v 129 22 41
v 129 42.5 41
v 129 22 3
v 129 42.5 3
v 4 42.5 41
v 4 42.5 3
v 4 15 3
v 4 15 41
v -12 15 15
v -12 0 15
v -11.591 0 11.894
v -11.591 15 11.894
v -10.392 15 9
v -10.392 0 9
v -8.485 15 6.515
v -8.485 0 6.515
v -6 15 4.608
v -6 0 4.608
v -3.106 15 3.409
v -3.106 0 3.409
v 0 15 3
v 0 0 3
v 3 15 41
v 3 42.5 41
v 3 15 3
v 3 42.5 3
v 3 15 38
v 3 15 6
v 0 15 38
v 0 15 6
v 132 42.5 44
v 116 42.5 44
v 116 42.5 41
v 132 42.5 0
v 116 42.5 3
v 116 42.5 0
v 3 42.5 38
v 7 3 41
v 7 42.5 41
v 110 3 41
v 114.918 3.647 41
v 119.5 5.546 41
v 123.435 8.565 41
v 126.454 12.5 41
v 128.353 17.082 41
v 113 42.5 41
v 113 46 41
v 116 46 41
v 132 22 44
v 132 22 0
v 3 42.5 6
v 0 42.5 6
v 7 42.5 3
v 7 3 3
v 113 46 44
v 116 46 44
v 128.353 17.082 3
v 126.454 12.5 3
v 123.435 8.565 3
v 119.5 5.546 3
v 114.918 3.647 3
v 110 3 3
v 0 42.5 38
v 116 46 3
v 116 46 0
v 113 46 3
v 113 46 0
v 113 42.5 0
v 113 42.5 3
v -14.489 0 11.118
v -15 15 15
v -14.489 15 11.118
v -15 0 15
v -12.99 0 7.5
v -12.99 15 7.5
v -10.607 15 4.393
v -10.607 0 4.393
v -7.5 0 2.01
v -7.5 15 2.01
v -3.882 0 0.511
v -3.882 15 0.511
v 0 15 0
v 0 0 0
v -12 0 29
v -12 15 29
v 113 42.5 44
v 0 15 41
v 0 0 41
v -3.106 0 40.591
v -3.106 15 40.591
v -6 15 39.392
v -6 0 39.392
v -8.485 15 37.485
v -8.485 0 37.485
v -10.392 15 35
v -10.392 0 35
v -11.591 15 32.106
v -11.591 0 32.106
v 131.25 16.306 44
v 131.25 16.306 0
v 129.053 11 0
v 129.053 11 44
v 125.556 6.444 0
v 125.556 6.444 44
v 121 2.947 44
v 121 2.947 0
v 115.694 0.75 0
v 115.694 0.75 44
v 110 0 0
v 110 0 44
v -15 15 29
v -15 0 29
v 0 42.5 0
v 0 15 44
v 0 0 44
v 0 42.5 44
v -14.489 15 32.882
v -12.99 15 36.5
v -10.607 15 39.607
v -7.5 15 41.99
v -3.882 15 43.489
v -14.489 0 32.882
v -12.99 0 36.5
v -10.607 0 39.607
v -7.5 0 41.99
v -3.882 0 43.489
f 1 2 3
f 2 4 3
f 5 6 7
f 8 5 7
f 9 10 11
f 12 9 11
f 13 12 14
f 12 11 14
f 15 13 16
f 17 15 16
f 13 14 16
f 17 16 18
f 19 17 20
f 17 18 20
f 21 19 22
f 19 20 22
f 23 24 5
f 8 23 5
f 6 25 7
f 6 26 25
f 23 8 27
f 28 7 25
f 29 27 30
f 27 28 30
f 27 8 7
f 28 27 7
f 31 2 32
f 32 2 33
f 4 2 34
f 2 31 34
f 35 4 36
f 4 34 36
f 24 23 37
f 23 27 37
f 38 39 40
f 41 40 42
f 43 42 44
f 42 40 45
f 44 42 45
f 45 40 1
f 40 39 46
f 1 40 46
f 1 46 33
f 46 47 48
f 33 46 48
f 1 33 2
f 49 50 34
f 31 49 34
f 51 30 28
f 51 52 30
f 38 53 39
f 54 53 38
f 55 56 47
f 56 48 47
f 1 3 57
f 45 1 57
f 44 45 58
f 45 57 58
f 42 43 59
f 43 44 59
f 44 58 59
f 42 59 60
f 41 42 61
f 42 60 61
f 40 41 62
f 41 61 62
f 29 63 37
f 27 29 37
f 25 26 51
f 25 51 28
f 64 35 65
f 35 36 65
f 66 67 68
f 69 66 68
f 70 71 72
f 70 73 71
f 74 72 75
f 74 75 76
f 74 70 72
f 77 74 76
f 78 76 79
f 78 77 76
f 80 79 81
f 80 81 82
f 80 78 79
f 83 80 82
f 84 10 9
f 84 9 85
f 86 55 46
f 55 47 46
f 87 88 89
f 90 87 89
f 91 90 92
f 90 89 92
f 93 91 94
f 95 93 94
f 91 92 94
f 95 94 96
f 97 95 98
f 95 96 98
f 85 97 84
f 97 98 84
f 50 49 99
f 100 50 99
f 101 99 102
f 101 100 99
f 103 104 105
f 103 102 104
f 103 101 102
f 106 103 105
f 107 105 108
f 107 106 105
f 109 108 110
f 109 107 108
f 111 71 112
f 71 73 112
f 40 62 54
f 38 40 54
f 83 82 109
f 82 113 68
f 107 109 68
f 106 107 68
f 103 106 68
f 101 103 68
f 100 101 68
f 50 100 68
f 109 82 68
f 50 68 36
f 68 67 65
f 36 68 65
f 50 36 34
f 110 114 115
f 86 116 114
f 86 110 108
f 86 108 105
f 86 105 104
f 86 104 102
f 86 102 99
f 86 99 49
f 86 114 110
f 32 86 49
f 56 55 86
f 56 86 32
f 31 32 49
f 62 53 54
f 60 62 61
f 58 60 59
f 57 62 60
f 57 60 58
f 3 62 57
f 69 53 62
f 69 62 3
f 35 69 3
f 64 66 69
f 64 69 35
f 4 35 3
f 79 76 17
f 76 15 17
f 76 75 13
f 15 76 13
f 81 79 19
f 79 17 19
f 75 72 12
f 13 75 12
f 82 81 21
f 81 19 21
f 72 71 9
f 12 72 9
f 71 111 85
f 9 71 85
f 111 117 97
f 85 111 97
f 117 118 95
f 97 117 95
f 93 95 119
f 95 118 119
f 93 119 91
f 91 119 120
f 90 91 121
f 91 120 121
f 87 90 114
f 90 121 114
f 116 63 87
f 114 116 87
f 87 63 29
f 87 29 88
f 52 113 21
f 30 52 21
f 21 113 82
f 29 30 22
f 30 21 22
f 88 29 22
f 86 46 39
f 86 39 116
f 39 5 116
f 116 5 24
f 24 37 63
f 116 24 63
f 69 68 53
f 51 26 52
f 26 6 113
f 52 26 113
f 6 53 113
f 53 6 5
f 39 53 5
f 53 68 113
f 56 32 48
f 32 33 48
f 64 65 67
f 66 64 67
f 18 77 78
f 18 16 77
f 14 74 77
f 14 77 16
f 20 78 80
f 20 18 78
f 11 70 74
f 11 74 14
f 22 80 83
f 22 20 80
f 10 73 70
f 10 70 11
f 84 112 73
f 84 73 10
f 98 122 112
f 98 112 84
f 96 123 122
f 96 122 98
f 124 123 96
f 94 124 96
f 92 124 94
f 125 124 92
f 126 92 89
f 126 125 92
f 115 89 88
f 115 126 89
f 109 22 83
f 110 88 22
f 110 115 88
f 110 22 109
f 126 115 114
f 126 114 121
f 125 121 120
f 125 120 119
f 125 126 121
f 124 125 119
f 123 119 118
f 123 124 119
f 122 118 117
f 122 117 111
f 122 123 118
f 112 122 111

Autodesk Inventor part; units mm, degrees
ref_plane "YZ Plane" through (0, 0, 0) normal (1, 0, 0) x (0, 1, 0)
ref_plane "XZ Plane" through (0, 0, 0) normal (0, 1, 0) x (-1, 0, 0)
ref_plane "XY Plane" through (0, 0, 0) normal (0, 0, 1) x (1, 0, 0)
sketch "Sketch1" plane through (0, 0, 0) normal (0, 0, 1) x (1, 0, 0)
  line L0 (0, 0) -> (110, 0)
  line L1 (0, 42.5) -> (0, 0)
  line L2 (132, 42.5) -> (116, 42.5)
  line L3 (116, 42.5) -> (116, 46)
  line L4 (116, 46) -> (113, 46)
  line L5 (113, 46) -> (113, 42.5)
  line L6 (113, 42.5) -> (110, 42.5)
  arc A0 (110, 0) -> (132, 22) centre (110, 22) ccw
  line L7 (110, 22) -> (110, 0) construction
  line L8 (132, 22) -> (132, 42.5)
  line L9 (132, 42.5) -> (116, 42.5)
  line L10 (113, 42.5) -> (0, 42.5)
  dimension "d2" = 16
  dimension "d3" = 3.5
  dimension "thickness" = 3
  dimension "d5" = 3
  dimension "d14" = 110
  dimension "d15" = 22
  dimension "d16" = 22
  dimension "height" = 20.5
  dimension "d18" = 110
  dimension "d19" = 90
  dimension "d20" = 3
extrude "Extrusion1" add sketch "Sketch1" along normal blind 3
sketch "Sketch2" plane through (0, 0, 3) normal (0, 0, 1) x (1, 0, 0)
  line L0 (0, 42.5) -> (3, 42.5)
  line L1 (113, 42.5) -> (0, 42.5) projected
  line L2 (3, 42.5) -> (3, 15)
  line L3 (0, 0) -> (110, 0) projected
  line L4 (4, 42.5) -> (4, 15)
  line L5 (4, 42.5) -> (7, 42.5)
  line L6 (7, 42.5) -> (7, 3)
  line L7 (0, 42.5) -> (0, 0) projected
  line L8 (0, 0) -> (0, 15)
  line L9 (3, 15) -> (4, 15)
  line L10 (0, 42.5) -> (0, 15)
  line L11 (132, 42.5) -> (129, 42.5)
  line L12 (132, 42.5) -> (116, 42.5) projected
  line L13 (129, 42.5) -> (129, 22)
  arc A0 (110, 0) -> (132, 22) centre (110, 22) ccw projected
  line L14 (132, 22) -> (132, 42.5) projected
  line L15 (132, 22) -> (132, 42.5)
  line L16 (7, 0) -> (110, 0)
  line L17 (7, 3) -> (110, 3)
  line L18 (129, 22) -> (129, 22)
  arc A1 (110, 3) -> (129, 22) centre (110, 22) ccw
  arc A2 (110, 0) -> (132, 22) centre (110, 22) ccw
  line L19 (0, 0) -> (7, 0)
  dimension "d27" = 27.5
  dimension "d28" = 3
  dimension "d29" = 3
  dimension "d35" = 3
  dimension "d36" = 3
  dimension "d37" = 3
  dimension "d38" = 20.5
  dimension "d39" = 103
  dimension "d40" = 103
  dimension "d41" = 1
  dimension "d42" = 27.5
  dimension "d43" = 1
extrude "Extrusion2" add sketch "Sketch2" along normal blind 3 contours L0 L2 L9 L4 L1 L6 L17 A1 L13 L11 L14 A0 L3 L7
sketch "Sketch3" plane through (0, 0, 6) normal (0, 0, 1) x (1, 0, 0)
  line L0 (113, 42.5) -> (7, 42.5) projected
  line L1 (4, 42.5) -> (4, 15) projected
  line L2 (7, 42.5) -> (4, 42.5)
  line L3 (4, 42.5) -> (4, 15)
  line L4 (3, 42.5) -> (3, 15) projected
  line L5 (4, 15) -> (3, 15)
  line L6 (3, 15) -> (0, 15)
  line L7 (0, 42.5) -> (0, 0) projected
  line L8 (0, 15) -> (0, 0)
  line L9 (0, 0) -> (7, 0)
  line L10 (0, 0) -> (110, 0) projected
  arc A0 (110, 0) -> (132, 22) centre (110, 22) ccw projected
  line L11 (132, 22) -> (132, 42.5) projected
  line L12 (132, 22) -> (132, 42.5)
  line L13 (132, 42.5) -> (128.8778, 42.5)
  line L14 (132, 42.5) -> (116, 42.5) projected
  line L15 (7, 42.5) -> (7, 3) projected
  line L16 (7, 42.5) -> (7, 3)
  line L17 (110, 3) -> (7, 3) projected
  line L18 (7, 3) -> (110, 3)
  line L19 (129, 42.5) -> (129, 22) projected
  line L20 (129, 42.5) -> (129, 22)
  arc A1 (110, 3) -> (129, 22) centre (110, 22) ccw
  arc A2 (110, 0) -> (132, 22) centre (110, 22) ccw
  line L21 (7, 0) -> (110, 0)
extrude "Extrusion3" add sketch "Sketch3" along normal blind 32
sketch "Sketch5" plane through (0, 0, 38) normal (0, 0, 1) x (1, 0, 0)
  arc A0 (110, 3) -> (129, 22) centre (110, 22) ccw projected
  arc A1 (110, 3) -> (129, 22) centre (110, 22) ccw
  arc A2 (110, 0) -> (132, 22) centre (110, 22) ccw
  line L0 (132, 22) -> (132, 42.5) projected
  line L1 (132, 22) -> (132, 42.5)
  line L2 (132, 42.5) -> (129, 42.5)
  line L3 (129, 22) -> (129, 42.5) projected
  line L4 (129, 42.5) -> (129, 22)
  line L5 (7, 42.5) -> (7, 3) projected
  line L6 (110, 3) -> (7, 3)
  line L7 (7, 3) -> (7, 42.5)
  line L8 (7, 42.5) -> (4, 42.5)
  line L9 (4, 15) -> (0, 15) projected
  line L10 (4, 42.5) -> (4, 15)
  line L11 (3, 15) -> (3, 42.5) projected
  line L12 (4, 15) -> (3, 15)
  line L13 (3, 15) -> (3, 42.5)
  line L14 (113, 42.5) -> (0, 42.5) projected
  line L15 (3, 42.5) -> (0, 42.5)
  line L16 (0, 15) -> (0, 0) projected
  line L17 (0, 42.5) -> (0, 15)
  line L18 (0, 0) -> (110, 0) projected
  line L19 (0, 15) -> (0, 0)
  line L20 (0, 0) -> (110, 0)
  line L21 (3, 42.5) -> (0, 42.5)
  line L22 (0, 42.5) -> (0, 15)
  line L23 (3, 15) -> (3, 42.5)
  line L24 (3, 15) -> (0, 15)
  dimension "d52" = 3
extrude "Extrusion4" add sketch "Sketch5" along normal blind 3 contours A0 L3 L2 L0 A2 L18 L16 L9 L10 L8 L5 L6 | L11 L9 L17 L14
sketch "Sketch6" plane through (0, 0, 41) normal (0, 0, 1) x (1, 0, 0)
  line L0 (132, 22) -> (132, 42.5) projected
  line L1 (129, 22) -> (129, 42.5) projected
  line L2 (132, 42.5) -> (129, 42.5)
  line L3 (132, 22) -> (132, 42.5)
  line L4 (7, 42.5) -> (7, 3) projected
  line L5 (0, 42.5) -> (0, 0) projected
  line L6 (7, 42.5) -> (0, 42.5)
  line L7 (0, 42.5) -> (0, 0)
  line L8 (0, 0) -> (7, 0)
  arc A0 (110, 0) -> (132, 22) centre (110, 22) ccw projected
  line L9 (110, 0) -> (7, 0)
  line L10 (0, 0) -> (110, 0) projected
  arc A1 (110, 0) -> (132, 22) centre (110, 22) ccw
  line L11 (7, 42.5) -> (4, 42.5) projected
  line L12 (132, 42.5) -> (116, 42.5) projected
  line L13 (116, 42.5) -> (116, 46) projected
  line L14 (116, 42.5) -> (116, 46)
  line L15 (116, 46) -> (113, 46) projected
  line L16 (116, 46) -> (113, 46)
  line L17 (113, 46) -> (113, 42.5) projected
  line L18 (113, 46) -> (113, 42.5)
  line L19 (129, 42.5) -> (116, 42.5)
  line L20 (113, 42.5) -> (7, 42.5)
  dimension "d55" = 125
  dimension "d56" = 125
  dimension "d57" = 22
  dimension "d58" = 90
  dimension "d59" = 90
  dimension "d60" = 20.5
  dimension "d61" = 3
extrude "Extrusion5" add sketch "Sketch6" along normal blind 3
sketch "Sketch7" plane through (0, 0, 0) normal (0, -1, 0) x (1, 0, 0)
  line L0 (0, 0) -> (-15, 0)
  line L1 (0, 15) -> (0, 0)
  line L2 (0, 29) -> (0, 44)
  line L3 (-15, 15) -> (-15, 29)
  line L4 (0, 0) -> (-3, 0)
  line L5 (-12, 15) -> (-12, 29)
  line L6 (0, 0) -> (0, 6) projected
  line L7 (0, 0) -> (0, 3)
  line L8 (0, 44) -> (0, 41)
  line L9 (0, 38) -> (0, 44) projected
  arc A0 (0, 41) -> (-12, 29) centre (0, 29) ccw
  line L10 (0, 44) -> (110, 44) projected
  arc A1 (0, 44) -> (-15, 29) centre (0, 29) ccw
  arc A2 (-12, 15) -> (0, 3) centre (0, 15) ccw
  arc A3 (-15, 15) -> (0, 0) centre (0, 15) ccw
  dimension "d73" = 15
  dimension "d74" = 3
  dimension "d75" = 15
extrude "Extrusion6" add sketch "Sketch7" against normal blind 15
equation "\"d5\" = thickness"
equation "\"d20\" = thickness"
equation "\"d21\" = thickness"
equation "\"d28\" = thickness"
equation "\"d29\" = thickness"
equation "\"d35\" = thickness"
equation "\"d36\" = thickness"
equation "\"d37\" = thickness"
equation "\"d38\" = height"
equation "\"d44\" = thickness"
equation "\"d53\" = thickness"
equation "\"d62\" = thickness"
properties part number "boxgeneric"
